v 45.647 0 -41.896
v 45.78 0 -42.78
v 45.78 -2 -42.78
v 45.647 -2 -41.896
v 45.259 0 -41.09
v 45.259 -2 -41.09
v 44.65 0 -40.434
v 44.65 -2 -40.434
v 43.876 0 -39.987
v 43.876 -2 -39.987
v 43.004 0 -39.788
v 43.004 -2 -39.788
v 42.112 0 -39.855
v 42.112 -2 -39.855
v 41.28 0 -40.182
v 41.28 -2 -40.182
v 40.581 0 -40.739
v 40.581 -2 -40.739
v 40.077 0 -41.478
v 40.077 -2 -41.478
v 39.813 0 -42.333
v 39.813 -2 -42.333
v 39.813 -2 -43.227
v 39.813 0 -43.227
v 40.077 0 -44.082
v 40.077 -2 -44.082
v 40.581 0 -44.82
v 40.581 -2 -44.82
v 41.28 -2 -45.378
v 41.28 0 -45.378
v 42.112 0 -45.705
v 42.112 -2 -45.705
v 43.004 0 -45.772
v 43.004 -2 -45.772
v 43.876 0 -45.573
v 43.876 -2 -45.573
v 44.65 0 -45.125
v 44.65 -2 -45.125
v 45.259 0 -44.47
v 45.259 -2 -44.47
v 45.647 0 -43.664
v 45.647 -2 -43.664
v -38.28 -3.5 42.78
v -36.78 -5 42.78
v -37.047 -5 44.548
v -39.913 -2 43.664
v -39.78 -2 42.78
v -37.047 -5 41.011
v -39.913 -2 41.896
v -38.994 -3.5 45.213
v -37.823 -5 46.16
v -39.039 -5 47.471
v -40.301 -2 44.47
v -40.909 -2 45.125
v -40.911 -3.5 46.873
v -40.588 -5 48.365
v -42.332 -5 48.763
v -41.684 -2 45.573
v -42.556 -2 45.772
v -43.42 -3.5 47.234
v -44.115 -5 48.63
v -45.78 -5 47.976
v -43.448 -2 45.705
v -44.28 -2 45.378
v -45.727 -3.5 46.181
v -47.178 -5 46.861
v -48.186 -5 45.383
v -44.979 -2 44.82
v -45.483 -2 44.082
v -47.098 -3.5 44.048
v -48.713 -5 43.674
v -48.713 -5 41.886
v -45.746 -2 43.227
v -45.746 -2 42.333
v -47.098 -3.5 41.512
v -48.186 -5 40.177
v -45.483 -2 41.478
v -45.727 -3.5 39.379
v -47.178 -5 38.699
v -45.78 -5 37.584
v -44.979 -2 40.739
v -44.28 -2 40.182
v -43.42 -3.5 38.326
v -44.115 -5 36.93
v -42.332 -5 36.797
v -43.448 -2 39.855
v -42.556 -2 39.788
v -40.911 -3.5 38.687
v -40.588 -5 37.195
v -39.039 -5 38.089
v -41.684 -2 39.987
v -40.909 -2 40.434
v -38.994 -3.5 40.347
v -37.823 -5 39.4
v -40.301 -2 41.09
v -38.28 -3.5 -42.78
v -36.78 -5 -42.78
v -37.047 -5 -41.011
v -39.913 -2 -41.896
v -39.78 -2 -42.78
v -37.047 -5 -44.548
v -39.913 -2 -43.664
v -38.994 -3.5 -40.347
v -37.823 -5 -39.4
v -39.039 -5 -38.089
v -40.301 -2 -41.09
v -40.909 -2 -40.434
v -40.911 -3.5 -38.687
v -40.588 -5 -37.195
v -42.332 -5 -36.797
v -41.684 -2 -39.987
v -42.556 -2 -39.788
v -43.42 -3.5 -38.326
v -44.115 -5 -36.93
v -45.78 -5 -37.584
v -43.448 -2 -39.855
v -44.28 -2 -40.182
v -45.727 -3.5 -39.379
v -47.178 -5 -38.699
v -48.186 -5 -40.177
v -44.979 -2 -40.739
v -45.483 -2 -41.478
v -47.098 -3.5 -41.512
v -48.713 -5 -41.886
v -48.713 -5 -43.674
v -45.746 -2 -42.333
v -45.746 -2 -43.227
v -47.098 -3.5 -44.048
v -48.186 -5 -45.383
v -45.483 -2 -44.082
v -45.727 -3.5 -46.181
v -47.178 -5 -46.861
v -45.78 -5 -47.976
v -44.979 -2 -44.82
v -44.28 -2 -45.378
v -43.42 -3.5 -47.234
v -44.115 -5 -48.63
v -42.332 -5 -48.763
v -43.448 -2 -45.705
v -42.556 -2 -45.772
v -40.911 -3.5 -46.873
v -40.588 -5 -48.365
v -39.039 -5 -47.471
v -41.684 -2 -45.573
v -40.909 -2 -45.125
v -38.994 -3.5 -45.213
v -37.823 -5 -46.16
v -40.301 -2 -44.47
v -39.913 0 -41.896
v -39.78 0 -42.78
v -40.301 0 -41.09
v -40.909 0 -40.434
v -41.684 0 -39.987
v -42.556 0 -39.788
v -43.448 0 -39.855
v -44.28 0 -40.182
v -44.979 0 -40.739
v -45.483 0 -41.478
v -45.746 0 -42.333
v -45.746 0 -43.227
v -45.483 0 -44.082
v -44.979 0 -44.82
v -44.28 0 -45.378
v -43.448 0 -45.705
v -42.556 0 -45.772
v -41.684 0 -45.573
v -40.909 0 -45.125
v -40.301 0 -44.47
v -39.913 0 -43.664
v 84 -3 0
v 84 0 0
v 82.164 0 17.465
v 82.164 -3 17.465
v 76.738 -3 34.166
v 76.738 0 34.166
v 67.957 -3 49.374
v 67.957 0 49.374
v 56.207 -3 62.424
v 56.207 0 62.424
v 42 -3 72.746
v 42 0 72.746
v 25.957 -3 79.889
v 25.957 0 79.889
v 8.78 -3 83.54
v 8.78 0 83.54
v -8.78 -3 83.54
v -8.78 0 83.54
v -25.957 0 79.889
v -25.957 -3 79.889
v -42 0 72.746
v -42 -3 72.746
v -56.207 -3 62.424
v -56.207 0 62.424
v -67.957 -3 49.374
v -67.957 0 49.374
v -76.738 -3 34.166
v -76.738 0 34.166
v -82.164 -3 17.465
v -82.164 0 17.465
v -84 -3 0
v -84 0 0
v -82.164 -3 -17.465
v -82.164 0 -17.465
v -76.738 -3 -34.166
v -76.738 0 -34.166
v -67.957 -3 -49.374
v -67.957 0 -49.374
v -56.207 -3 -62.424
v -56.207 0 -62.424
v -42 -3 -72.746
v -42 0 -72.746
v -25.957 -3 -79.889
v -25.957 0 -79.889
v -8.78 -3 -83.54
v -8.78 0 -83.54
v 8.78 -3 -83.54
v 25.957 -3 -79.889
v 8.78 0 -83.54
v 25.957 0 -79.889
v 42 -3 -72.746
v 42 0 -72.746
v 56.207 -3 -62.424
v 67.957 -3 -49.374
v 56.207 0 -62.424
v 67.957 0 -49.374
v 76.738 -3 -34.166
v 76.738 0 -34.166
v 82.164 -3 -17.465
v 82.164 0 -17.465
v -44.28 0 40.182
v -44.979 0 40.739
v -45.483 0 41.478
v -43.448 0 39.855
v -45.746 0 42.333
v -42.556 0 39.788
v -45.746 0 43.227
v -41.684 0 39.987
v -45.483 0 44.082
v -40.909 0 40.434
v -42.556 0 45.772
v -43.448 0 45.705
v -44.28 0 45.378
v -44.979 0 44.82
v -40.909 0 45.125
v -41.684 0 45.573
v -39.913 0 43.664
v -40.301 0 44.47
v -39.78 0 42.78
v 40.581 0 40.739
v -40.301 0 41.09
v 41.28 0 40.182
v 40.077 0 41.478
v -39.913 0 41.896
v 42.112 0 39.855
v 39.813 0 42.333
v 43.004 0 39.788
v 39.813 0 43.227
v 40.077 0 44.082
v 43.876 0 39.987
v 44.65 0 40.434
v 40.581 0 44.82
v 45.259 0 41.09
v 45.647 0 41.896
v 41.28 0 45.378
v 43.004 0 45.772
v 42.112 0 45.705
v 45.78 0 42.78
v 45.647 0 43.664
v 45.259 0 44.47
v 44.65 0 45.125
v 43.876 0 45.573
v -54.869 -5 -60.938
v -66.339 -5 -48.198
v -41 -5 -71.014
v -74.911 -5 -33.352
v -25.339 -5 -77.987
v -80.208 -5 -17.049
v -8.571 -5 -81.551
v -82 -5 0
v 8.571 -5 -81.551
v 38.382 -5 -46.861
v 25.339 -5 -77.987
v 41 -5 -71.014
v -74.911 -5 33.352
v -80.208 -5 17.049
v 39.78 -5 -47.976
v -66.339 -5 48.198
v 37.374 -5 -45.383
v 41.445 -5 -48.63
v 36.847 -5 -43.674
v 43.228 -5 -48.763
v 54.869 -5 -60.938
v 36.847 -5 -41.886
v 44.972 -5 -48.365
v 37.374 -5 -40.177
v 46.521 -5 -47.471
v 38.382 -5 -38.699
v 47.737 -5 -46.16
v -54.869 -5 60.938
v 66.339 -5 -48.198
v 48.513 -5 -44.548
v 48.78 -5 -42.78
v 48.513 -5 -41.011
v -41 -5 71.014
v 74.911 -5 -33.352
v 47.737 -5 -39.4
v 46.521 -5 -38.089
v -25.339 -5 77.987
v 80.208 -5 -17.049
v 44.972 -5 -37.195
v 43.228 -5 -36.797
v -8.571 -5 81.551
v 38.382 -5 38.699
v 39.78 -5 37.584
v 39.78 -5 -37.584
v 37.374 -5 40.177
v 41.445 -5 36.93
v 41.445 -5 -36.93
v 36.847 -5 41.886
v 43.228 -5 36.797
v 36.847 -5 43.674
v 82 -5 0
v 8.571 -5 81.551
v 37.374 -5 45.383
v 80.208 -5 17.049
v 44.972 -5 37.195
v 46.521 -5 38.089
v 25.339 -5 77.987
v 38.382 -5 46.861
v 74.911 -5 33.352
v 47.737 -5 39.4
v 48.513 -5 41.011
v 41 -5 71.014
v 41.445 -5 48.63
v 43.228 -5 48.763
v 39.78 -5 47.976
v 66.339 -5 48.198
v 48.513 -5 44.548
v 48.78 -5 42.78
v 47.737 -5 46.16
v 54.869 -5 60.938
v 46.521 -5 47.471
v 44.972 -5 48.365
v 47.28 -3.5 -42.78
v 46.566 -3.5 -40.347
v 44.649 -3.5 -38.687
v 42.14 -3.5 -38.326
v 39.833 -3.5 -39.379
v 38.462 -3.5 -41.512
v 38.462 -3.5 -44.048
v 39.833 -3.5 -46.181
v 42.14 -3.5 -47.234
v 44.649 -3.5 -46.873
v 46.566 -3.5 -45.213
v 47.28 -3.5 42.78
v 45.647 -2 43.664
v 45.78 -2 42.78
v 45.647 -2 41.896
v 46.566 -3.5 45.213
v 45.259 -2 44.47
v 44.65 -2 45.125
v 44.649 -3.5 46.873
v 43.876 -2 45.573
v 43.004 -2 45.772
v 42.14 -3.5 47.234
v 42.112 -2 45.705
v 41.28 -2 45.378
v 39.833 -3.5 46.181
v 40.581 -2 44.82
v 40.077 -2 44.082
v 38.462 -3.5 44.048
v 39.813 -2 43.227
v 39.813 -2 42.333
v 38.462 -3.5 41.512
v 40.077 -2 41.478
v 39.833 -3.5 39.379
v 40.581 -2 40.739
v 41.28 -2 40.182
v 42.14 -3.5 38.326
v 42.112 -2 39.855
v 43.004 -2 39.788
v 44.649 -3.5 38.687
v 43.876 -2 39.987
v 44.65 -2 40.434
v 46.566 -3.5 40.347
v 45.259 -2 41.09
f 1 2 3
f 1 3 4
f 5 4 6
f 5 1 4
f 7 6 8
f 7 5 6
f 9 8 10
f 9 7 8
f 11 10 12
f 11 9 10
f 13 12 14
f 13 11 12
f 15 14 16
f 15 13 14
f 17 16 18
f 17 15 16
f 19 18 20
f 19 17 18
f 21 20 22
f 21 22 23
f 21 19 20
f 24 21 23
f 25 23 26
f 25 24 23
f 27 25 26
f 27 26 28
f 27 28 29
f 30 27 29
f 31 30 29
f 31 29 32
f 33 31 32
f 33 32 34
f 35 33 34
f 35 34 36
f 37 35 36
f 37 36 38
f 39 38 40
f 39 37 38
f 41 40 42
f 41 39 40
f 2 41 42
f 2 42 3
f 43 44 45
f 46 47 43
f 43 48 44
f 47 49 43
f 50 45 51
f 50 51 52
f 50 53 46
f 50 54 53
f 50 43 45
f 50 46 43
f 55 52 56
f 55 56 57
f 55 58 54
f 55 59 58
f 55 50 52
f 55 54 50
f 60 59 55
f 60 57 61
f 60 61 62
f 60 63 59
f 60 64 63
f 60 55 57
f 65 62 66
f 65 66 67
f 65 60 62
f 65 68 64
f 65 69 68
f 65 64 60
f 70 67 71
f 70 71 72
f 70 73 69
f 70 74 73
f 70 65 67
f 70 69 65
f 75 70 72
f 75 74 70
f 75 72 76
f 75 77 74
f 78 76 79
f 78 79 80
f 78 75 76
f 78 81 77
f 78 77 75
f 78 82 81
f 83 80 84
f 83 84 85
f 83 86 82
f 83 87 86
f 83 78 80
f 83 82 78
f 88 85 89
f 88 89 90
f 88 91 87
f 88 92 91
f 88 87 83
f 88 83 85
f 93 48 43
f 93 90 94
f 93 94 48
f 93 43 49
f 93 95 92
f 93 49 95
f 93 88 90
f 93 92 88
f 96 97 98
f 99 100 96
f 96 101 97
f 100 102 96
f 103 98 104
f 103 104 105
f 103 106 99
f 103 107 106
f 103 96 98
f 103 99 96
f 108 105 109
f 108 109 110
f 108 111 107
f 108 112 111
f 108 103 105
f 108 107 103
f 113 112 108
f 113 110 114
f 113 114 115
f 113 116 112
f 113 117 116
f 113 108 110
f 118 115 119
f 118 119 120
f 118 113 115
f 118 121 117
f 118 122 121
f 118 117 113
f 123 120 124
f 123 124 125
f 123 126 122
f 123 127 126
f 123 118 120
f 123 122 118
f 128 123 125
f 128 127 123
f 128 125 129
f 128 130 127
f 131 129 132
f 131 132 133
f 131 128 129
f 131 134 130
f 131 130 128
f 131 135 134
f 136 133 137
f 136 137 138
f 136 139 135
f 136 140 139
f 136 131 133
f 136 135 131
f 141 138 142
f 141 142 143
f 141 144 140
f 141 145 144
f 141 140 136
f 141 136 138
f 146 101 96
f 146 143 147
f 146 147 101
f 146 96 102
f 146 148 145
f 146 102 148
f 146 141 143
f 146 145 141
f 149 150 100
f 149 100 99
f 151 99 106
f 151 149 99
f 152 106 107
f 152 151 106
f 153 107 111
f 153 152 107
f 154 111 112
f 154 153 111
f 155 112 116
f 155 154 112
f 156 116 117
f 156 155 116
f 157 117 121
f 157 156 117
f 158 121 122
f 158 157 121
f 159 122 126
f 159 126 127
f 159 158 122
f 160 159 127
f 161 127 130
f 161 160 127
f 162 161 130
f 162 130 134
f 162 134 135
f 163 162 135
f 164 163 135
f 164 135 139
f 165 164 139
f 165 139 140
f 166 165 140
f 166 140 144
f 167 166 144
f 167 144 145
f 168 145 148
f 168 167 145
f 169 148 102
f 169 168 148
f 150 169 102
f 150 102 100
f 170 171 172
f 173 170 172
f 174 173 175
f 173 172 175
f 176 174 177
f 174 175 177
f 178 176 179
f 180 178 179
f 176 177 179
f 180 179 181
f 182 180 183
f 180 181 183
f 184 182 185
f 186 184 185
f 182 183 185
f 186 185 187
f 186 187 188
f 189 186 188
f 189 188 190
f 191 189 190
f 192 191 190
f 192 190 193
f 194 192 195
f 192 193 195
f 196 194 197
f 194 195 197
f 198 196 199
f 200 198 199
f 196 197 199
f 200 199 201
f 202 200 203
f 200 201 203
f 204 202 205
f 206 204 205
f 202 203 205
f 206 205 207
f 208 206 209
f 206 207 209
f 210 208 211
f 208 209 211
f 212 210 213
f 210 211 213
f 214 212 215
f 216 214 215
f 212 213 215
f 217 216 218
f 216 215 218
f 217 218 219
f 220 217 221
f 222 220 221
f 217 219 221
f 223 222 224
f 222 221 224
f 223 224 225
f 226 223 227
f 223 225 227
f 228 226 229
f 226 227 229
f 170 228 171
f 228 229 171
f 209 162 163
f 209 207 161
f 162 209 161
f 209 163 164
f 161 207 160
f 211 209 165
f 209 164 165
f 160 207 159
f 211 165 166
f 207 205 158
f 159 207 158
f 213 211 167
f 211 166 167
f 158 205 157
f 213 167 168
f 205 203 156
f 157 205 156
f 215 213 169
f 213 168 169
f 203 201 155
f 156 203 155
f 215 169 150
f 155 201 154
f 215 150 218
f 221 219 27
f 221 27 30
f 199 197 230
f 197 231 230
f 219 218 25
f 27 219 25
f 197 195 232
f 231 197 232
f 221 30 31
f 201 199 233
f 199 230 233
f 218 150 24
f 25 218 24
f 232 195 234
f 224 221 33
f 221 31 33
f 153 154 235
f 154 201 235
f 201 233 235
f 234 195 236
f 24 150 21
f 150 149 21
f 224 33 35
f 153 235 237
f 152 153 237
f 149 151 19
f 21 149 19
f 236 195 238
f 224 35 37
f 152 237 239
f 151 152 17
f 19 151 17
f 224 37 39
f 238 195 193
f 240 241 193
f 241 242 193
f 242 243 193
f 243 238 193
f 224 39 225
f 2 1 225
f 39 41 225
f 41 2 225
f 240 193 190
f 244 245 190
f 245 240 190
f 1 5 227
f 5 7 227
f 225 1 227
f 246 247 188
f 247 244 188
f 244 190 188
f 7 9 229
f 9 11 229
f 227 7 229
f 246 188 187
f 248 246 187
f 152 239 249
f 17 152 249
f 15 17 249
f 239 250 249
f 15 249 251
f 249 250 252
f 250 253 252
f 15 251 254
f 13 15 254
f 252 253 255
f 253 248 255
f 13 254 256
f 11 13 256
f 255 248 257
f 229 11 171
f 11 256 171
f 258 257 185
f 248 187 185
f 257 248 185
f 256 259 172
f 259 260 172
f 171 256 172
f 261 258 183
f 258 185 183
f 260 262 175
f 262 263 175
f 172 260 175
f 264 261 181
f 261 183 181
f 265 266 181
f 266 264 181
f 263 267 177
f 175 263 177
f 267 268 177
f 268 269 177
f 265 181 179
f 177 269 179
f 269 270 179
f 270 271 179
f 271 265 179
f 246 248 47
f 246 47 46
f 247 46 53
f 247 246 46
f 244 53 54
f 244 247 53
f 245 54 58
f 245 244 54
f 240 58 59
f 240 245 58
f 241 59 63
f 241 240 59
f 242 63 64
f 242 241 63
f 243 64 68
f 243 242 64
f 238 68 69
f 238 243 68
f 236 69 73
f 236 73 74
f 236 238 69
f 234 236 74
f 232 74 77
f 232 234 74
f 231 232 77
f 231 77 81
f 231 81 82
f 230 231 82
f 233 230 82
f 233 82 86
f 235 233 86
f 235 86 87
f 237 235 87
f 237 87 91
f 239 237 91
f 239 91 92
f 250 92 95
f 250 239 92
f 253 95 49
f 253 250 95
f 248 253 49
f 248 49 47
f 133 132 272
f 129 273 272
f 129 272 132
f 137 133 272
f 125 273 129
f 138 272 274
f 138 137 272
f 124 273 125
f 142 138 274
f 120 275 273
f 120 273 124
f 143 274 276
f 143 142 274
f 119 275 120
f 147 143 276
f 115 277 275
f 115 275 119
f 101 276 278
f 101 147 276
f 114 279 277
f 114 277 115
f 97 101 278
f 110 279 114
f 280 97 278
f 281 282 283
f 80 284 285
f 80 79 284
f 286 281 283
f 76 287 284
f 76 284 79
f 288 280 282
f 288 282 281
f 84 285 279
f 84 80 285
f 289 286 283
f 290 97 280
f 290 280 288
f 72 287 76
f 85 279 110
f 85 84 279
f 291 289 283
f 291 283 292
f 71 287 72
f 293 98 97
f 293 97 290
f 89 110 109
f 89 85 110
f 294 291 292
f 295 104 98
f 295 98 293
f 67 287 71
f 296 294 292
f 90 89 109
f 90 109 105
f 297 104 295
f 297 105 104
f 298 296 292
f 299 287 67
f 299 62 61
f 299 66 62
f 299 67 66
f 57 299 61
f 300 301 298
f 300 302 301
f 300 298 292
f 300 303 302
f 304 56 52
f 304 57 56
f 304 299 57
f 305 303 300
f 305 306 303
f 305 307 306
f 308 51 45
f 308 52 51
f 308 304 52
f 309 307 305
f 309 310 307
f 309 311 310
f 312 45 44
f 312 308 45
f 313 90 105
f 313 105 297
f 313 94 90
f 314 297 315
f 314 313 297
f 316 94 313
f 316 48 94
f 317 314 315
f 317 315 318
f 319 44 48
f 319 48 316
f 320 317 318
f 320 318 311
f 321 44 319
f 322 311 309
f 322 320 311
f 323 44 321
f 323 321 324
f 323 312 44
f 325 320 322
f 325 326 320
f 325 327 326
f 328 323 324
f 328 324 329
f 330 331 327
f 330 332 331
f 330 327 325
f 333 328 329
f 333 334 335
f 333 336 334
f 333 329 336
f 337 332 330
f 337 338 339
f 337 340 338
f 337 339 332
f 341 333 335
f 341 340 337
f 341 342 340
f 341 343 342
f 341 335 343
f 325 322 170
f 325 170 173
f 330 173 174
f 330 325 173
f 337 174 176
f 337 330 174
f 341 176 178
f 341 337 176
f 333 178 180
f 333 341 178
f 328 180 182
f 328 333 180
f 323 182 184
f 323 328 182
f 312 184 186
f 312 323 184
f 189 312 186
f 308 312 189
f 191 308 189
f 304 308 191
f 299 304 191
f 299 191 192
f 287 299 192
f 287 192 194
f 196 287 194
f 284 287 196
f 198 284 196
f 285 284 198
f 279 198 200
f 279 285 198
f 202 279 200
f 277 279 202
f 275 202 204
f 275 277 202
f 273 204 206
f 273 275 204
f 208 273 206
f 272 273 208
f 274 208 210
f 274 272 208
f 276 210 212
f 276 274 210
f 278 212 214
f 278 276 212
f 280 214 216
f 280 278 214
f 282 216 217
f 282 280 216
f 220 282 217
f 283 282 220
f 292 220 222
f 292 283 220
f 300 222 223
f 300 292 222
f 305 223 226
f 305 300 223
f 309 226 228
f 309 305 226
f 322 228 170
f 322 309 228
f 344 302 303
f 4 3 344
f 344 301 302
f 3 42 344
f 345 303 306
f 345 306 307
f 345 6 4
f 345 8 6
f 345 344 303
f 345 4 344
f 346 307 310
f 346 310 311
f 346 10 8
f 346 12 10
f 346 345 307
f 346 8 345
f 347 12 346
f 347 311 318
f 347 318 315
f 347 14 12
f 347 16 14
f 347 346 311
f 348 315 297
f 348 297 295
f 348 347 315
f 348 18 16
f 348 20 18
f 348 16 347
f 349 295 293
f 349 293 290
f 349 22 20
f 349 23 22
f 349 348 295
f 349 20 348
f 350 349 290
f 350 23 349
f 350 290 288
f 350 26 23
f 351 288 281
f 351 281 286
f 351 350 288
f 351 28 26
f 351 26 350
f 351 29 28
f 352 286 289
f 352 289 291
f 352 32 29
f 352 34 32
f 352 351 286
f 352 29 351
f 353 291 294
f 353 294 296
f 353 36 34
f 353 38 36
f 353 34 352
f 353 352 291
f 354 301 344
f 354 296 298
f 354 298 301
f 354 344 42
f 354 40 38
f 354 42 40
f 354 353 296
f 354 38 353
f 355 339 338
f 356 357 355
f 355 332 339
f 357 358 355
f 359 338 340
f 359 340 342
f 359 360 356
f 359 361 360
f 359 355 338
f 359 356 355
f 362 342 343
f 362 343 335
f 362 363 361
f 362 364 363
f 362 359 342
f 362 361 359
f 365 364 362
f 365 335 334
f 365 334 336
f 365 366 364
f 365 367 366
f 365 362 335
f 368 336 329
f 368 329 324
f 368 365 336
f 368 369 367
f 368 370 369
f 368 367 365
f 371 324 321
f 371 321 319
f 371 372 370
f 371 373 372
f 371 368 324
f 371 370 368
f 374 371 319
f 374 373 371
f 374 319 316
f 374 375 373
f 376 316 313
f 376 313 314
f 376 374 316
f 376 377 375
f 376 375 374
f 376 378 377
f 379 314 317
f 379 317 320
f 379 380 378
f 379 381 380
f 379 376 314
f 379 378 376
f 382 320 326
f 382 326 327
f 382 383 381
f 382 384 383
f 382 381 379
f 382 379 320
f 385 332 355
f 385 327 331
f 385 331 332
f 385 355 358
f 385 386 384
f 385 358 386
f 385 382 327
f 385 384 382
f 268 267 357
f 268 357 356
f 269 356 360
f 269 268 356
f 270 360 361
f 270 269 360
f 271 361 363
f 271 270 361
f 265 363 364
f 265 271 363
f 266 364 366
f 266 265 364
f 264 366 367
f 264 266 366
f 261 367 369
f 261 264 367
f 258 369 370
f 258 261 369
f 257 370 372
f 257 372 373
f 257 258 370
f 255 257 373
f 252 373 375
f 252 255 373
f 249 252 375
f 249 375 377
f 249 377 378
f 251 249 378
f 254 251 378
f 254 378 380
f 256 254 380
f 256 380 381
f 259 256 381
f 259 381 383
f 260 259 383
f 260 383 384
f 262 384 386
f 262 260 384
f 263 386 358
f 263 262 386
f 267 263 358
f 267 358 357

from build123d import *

# Parameters (mm, degrees)
F0_R     = 84
F0_R_2   = 3
F1_DEPTH = 5
F2_SIZE  = 2
F3_SIZE  = 3


# Not quite as in the source:
# - a feature names something its author has since deleted; it is built from what else it names


with BuildPart() as f1:
    # F0 (on Front) → F1 (new body)
    with BuildSketch(Plane.XZ):
        Circle(F0_R)
        with Locations((-42.7799602618, -42.7799602618)):
            Circle(F0_R_2, mode=Mode.SUBTRACT)
        with Locations((42.7799602618, -42.7799602618)):
            Circle(F0_R_2, mode=Mode.SUBTRACT)
        with Locations((-42.7799602618, 42.7799602618)):
            Circle(F0_R_2, mode=Mode.SUBTRACT)
        with Locations((42.7799602618, 42.7799602618)):
            Circle(F0_R_2, mode=Mode.SUBTRACT)
    extrude(amount=F1_DEPTH)

    # F2
    f2_edges = [f1.edges().sort_by_distance(p)[0] for p in [
        (-84, -5, 0),
    ]]
    chamfer(f2_edges, length=F2_SIZE)

    # F3
    f3_edges = [f1.edges().sort_by_distance(p)[0] for p in [
        (-45.77996, -5, 42.77996),
        (39.77996, -5, 42.77996),
        (-45.77996, -5, -42.77996),
        (39.77996, -5, -42.77996),
    ]]
    chamfer(f3_edges, length=F3_SIZE)


solid = f1.part
